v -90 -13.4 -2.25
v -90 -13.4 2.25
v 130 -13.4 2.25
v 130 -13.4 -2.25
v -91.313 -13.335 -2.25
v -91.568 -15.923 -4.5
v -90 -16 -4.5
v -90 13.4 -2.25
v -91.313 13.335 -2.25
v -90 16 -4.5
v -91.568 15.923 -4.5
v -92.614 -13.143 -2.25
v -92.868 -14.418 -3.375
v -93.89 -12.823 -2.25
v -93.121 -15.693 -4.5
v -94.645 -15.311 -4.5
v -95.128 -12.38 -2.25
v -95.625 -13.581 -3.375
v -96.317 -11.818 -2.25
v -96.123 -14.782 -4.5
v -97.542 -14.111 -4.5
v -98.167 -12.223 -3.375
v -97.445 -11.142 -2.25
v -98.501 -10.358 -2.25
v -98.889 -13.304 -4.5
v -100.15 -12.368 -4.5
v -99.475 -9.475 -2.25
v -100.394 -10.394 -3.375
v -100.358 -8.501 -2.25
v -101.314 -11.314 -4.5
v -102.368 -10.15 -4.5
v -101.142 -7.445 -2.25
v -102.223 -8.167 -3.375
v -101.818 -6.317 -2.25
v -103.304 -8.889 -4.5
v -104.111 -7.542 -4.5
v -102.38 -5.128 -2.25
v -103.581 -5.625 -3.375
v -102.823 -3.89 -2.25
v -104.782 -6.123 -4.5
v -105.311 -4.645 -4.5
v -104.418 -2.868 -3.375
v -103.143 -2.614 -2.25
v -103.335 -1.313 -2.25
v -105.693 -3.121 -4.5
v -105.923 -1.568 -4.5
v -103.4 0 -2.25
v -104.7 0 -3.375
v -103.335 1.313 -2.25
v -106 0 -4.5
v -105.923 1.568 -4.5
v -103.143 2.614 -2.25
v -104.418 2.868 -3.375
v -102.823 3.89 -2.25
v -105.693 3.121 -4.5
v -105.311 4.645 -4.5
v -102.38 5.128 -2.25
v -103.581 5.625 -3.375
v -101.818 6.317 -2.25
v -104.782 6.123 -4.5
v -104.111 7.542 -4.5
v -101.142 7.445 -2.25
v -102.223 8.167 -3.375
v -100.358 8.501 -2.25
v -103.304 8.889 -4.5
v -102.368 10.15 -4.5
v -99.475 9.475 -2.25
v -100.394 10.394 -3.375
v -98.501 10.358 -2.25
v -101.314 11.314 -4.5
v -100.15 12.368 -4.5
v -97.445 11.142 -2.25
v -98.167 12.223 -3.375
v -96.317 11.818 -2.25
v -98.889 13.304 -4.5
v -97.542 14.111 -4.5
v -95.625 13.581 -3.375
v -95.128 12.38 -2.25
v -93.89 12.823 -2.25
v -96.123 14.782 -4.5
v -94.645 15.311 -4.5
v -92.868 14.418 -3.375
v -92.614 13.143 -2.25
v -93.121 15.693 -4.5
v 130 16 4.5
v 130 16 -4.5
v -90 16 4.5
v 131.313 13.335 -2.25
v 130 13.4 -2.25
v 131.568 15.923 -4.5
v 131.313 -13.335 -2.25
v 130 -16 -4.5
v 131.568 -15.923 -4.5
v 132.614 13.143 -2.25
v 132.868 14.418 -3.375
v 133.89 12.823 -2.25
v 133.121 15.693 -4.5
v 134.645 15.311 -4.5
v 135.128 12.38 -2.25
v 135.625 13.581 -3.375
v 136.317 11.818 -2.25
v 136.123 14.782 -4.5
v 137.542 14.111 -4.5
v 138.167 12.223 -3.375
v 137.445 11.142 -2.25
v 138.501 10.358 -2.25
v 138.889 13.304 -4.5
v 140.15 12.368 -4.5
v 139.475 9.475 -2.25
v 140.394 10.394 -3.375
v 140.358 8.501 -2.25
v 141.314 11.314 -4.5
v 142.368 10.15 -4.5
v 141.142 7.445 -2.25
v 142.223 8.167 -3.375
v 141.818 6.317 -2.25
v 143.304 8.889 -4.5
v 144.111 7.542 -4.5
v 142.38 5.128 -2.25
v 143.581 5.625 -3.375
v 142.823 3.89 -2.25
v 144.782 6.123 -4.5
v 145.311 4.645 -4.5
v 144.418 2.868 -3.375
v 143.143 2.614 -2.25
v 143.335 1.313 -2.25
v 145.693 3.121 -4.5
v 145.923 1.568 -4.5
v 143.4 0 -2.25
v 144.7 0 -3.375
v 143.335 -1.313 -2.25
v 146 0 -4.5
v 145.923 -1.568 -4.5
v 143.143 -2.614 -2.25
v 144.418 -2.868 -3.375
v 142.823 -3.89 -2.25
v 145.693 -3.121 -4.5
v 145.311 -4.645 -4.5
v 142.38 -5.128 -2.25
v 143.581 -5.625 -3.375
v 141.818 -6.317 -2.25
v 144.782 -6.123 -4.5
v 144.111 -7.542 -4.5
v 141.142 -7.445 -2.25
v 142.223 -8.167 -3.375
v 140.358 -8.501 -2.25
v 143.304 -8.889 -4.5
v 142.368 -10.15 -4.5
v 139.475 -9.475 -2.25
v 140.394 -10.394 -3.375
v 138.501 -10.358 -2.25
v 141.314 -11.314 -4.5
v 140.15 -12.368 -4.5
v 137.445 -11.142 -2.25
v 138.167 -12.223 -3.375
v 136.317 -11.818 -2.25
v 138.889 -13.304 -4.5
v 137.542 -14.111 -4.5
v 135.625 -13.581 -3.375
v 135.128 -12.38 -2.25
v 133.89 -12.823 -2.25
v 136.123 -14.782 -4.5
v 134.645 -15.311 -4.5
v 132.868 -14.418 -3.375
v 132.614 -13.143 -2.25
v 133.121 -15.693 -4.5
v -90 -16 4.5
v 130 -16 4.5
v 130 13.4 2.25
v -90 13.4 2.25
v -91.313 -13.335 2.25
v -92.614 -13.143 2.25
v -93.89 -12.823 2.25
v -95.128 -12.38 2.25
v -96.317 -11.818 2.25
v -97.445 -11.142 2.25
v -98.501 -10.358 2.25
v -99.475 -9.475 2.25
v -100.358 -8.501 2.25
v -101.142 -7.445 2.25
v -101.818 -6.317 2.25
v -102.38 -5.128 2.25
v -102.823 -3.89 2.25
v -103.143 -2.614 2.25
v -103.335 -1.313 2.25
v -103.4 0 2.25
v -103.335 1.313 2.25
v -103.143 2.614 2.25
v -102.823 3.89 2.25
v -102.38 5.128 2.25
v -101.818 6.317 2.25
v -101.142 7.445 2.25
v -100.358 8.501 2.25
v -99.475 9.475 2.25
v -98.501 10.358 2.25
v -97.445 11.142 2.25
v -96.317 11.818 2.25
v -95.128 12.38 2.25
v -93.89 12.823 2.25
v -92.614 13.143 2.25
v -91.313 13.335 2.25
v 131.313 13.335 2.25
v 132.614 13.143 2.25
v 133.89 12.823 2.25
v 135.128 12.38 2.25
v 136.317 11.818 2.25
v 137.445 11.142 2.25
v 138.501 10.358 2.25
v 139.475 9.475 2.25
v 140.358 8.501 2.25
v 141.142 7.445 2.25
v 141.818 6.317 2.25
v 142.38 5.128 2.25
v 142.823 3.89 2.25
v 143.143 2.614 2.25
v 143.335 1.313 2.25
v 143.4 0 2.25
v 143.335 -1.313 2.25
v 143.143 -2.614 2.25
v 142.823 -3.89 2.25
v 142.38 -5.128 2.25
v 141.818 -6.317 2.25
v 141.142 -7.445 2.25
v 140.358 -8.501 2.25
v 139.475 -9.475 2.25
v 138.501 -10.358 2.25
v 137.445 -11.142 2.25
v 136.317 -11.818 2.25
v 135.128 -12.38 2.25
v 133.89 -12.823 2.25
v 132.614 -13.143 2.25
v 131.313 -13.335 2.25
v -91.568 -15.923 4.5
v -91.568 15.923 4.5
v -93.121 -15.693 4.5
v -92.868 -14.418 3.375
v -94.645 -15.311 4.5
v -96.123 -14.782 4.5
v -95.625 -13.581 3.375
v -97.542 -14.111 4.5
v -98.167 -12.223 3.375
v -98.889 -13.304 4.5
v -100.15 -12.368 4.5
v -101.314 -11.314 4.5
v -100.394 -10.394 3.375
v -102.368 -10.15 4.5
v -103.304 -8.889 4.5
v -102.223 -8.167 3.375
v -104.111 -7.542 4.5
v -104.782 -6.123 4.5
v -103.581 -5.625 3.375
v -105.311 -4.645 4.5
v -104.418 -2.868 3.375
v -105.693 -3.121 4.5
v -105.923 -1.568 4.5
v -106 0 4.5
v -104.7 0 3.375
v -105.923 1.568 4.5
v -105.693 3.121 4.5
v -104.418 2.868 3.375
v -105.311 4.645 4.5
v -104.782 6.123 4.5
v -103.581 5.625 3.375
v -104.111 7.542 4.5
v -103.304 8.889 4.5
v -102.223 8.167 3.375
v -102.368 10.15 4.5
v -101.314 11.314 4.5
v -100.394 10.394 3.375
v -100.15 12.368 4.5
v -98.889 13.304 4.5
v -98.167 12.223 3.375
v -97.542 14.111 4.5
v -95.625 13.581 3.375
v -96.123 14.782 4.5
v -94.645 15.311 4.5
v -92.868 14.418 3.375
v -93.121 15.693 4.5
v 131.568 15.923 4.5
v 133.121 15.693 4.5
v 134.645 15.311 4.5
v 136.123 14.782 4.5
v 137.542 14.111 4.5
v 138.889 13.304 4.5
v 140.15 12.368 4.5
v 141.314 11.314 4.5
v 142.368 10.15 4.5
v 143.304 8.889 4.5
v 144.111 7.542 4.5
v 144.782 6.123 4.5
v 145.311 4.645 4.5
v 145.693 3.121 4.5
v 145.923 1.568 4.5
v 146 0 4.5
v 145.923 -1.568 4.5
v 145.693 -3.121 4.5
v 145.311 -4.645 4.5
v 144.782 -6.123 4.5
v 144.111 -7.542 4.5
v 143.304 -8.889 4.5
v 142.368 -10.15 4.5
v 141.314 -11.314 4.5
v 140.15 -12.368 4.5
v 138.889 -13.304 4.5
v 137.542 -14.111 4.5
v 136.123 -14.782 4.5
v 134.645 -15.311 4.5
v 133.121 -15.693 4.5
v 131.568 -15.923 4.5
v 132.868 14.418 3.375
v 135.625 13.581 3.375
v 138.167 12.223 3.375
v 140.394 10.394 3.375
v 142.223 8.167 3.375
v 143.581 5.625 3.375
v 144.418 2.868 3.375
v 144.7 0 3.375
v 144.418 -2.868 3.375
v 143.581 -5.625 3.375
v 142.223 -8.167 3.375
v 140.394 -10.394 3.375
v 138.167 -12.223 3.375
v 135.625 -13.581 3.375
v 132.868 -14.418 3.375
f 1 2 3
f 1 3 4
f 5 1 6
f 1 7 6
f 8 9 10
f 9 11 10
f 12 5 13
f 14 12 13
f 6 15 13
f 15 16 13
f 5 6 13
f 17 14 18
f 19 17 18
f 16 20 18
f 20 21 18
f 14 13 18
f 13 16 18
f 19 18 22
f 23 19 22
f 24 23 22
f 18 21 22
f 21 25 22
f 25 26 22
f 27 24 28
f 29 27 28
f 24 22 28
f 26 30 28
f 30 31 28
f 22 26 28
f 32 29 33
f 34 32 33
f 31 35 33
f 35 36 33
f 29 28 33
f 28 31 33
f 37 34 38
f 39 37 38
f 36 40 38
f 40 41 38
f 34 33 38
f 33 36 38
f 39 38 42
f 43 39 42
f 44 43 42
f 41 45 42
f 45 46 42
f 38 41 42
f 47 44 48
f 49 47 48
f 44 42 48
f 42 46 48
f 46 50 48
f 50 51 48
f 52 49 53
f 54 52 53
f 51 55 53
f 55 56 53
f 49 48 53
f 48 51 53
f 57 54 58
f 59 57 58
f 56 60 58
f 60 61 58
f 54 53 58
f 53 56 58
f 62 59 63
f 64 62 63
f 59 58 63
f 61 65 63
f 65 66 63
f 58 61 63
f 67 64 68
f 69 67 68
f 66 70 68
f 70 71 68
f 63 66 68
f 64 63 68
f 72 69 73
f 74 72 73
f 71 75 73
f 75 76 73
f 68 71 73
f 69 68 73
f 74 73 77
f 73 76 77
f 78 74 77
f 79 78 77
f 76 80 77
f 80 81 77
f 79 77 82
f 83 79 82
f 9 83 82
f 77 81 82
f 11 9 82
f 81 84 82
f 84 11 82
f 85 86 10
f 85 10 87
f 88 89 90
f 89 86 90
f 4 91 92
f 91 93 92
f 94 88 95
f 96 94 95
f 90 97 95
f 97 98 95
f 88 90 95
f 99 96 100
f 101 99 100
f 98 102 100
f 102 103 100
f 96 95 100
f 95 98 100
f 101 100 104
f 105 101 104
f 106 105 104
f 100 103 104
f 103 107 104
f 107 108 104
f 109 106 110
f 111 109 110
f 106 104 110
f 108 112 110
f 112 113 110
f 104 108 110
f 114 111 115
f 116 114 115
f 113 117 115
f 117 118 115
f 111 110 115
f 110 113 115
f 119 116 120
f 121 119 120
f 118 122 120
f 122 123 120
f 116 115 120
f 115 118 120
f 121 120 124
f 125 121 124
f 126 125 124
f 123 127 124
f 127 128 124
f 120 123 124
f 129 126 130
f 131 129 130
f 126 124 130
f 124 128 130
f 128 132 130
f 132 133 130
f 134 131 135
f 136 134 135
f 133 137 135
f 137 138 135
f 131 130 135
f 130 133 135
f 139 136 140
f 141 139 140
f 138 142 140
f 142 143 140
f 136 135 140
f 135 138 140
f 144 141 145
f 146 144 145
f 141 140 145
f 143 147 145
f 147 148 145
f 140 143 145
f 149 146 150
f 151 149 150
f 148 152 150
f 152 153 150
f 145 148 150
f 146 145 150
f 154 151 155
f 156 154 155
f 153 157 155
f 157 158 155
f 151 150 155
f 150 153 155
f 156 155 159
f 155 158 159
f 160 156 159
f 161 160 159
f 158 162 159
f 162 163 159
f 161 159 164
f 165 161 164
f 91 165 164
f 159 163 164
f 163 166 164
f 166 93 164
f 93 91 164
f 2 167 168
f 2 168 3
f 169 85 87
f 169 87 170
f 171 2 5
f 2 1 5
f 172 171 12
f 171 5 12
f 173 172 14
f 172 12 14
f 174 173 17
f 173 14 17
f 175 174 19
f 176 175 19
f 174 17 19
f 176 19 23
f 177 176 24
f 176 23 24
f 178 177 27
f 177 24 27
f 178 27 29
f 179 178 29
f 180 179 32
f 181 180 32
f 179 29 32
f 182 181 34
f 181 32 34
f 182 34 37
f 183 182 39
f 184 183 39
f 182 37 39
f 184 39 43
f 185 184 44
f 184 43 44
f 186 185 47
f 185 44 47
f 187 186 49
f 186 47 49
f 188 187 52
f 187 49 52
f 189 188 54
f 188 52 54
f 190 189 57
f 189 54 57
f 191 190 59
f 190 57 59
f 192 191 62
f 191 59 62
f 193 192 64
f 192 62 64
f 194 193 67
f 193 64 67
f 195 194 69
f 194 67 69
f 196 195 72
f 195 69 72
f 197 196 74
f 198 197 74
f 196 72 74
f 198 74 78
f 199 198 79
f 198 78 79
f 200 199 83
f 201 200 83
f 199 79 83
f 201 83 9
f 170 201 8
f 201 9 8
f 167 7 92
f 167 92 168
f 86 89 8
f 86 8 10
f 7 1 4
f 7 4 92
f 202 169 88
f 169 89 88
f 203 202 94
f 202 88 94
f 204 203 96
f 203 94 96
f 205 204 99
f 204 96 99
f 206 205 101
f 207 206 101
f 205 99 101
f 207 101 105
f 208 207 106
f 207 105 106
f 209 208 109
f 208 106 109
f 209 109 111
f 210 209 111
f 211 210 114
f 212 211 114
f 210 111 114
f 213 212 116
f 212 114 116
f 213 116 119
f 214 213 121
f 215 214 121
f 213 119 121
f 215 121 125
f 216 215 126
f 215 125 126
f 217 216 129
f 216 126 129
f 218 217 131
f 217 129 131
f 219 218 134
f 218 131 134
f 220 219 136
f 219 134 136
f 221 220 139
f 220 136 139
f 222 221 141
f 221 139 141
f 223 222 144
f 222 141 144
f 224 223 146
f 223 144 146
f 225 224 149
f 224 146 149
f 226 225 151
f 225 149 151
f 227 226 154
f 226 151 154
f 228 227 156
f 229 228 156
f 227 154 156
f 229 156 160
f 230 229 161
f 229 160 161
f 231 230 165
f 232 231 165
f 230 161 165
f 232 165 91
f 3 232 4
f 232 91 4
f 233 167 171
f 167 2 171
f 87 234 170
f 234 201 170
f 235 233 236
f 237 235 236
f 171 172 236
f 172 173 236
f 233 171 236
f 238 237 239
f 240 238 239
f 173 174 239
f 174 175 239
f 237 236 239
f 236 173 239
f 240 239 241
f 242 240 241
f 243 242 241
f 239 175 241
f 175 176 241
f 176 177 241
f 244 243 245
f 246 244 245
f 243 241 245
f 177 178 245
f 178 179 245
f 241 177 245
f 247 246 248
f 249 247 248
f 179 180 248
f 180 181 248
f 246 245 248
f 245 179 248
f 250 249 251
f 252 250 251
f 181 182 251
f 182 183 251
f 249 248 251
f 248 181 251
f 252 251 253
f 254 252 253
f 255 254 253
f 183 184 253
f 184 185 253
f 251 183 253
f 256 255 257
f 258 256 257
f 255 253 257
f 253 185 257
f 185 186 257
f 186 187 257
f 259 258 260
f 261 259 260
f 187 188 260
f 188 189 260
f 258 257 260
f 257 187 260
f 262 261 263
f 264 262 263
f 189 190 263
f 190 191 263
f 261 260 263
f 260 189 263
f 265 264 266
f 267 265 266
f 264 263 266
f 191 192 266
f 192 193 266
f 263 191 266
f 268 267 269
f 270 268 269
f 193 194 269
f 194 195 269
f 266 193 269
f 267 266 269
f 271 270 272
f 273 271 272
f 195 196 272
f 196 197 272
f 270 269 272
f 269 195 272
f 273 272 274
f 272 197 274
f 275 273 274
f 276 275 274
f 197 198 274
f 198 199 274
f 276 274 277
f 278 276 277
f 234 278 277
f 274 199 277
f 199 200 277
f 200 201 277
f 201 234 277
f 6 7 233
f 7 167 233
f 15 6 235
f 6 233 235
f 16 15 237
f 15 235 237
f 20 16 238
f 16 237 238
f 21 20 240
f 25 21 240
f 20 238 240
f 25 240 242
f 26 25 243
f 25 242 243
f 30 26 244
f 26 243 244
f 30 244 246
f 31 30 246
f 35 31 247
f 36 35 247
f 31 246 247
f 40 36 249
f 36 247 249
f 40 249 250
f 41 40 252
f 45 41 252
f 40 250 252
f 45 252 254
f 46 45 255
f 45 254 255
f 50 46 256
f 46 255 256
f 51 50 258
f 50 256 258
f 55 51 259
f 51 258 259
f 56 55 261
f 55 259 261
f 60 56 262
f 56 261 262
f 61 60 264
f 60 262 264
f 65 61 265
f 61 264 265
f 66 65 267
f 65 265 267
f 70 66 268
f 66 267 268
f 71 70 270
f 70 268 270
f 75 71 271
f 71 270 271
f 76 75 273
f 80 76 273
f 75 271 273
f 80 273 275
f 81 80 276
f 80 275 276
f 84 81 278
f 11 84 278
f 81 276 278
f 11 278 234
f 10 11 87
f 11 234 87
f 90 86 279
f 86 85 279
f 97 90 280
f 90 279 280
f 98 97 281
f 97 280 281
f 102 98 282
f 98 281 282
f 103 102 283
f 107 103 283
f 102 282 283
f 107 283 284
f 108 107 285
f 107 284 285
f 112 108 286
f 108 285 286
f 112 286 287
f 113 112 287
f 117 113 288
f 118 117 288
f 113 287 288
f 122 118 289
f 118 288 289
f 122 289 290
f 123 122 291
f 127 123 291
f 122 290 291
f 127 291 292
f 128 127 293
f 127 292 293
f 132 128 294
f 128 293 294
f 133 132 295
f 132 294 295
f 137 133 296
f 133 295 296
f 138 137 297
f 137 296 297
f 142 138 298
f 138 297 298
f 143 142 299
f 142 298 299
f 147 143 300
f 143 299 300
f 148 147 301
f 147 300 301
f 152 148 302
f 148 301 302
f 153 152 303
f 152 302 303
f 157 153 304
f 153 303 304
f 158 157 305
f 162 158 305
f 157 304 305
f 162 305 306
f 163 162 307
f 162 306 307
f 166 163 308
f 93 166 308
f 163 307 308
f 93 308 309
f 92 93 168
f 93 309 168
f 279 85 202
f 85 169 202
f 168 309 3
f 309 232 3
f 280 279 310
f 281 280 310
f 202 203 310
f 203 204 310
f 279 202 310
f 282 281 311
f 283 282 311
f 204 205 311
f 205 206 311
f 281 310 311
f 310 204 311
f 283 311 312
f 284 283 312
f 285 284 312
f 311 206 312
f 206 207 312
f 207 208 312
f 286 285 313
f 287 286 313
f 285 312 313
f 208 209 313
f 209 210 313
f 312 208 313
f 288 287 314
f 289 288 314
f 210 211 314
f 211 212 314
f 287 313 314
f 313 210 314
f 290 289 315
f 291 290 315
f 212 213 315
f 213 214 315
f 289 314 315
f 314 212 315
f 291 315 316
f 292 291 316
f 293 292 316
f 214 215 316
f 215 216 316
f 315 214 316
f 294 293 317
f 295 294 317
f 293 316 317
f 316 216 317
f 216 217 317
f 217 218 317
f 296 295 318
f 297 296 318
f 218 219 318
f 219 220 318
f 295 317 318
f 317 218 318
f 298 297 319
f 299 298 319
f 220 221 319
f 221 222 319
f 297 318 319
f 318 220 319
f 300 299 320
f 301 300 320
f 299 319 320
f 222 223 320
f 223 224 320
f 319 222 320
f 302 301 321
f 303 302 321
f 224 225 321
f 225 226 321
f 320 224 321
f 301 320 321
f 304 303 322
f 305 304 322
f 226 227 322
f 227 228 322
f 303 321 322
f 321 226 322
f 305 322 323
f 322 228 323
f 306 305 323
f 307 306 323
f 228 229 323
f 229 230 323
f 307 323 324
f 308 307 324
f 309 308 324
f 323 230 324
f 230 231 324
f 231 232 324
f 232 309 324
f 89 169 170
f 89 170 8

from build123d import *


with BuildPart() as part:
    # 扫描1: sweep along a path in 草图1
    with BuildLine(Plane.XY) as sweep_1_path:
        Line((-90, 16), (130, 16))
        ThreePointArc((130, 16), (146, 0), (130, -16))
        Line((130, -16), (-90, -16))
        ThreePointArc((-90, -16), (-106, 0), (-90, 16))
    # 草图2 → 扫描1 (sweep)
    with BuildSketch(Plane(origin=(0, 0, 0), x_dir=(1, 0, 0), z_dir=(0, 1, 0))):
        Polygon((-106, 0), (-106, 4.5), (-103.4, 2.25), (-103.4, -2.25), (-106, -4.5), align=None)
    sweep(path=sweep_1_path.line)


solid = part.part
